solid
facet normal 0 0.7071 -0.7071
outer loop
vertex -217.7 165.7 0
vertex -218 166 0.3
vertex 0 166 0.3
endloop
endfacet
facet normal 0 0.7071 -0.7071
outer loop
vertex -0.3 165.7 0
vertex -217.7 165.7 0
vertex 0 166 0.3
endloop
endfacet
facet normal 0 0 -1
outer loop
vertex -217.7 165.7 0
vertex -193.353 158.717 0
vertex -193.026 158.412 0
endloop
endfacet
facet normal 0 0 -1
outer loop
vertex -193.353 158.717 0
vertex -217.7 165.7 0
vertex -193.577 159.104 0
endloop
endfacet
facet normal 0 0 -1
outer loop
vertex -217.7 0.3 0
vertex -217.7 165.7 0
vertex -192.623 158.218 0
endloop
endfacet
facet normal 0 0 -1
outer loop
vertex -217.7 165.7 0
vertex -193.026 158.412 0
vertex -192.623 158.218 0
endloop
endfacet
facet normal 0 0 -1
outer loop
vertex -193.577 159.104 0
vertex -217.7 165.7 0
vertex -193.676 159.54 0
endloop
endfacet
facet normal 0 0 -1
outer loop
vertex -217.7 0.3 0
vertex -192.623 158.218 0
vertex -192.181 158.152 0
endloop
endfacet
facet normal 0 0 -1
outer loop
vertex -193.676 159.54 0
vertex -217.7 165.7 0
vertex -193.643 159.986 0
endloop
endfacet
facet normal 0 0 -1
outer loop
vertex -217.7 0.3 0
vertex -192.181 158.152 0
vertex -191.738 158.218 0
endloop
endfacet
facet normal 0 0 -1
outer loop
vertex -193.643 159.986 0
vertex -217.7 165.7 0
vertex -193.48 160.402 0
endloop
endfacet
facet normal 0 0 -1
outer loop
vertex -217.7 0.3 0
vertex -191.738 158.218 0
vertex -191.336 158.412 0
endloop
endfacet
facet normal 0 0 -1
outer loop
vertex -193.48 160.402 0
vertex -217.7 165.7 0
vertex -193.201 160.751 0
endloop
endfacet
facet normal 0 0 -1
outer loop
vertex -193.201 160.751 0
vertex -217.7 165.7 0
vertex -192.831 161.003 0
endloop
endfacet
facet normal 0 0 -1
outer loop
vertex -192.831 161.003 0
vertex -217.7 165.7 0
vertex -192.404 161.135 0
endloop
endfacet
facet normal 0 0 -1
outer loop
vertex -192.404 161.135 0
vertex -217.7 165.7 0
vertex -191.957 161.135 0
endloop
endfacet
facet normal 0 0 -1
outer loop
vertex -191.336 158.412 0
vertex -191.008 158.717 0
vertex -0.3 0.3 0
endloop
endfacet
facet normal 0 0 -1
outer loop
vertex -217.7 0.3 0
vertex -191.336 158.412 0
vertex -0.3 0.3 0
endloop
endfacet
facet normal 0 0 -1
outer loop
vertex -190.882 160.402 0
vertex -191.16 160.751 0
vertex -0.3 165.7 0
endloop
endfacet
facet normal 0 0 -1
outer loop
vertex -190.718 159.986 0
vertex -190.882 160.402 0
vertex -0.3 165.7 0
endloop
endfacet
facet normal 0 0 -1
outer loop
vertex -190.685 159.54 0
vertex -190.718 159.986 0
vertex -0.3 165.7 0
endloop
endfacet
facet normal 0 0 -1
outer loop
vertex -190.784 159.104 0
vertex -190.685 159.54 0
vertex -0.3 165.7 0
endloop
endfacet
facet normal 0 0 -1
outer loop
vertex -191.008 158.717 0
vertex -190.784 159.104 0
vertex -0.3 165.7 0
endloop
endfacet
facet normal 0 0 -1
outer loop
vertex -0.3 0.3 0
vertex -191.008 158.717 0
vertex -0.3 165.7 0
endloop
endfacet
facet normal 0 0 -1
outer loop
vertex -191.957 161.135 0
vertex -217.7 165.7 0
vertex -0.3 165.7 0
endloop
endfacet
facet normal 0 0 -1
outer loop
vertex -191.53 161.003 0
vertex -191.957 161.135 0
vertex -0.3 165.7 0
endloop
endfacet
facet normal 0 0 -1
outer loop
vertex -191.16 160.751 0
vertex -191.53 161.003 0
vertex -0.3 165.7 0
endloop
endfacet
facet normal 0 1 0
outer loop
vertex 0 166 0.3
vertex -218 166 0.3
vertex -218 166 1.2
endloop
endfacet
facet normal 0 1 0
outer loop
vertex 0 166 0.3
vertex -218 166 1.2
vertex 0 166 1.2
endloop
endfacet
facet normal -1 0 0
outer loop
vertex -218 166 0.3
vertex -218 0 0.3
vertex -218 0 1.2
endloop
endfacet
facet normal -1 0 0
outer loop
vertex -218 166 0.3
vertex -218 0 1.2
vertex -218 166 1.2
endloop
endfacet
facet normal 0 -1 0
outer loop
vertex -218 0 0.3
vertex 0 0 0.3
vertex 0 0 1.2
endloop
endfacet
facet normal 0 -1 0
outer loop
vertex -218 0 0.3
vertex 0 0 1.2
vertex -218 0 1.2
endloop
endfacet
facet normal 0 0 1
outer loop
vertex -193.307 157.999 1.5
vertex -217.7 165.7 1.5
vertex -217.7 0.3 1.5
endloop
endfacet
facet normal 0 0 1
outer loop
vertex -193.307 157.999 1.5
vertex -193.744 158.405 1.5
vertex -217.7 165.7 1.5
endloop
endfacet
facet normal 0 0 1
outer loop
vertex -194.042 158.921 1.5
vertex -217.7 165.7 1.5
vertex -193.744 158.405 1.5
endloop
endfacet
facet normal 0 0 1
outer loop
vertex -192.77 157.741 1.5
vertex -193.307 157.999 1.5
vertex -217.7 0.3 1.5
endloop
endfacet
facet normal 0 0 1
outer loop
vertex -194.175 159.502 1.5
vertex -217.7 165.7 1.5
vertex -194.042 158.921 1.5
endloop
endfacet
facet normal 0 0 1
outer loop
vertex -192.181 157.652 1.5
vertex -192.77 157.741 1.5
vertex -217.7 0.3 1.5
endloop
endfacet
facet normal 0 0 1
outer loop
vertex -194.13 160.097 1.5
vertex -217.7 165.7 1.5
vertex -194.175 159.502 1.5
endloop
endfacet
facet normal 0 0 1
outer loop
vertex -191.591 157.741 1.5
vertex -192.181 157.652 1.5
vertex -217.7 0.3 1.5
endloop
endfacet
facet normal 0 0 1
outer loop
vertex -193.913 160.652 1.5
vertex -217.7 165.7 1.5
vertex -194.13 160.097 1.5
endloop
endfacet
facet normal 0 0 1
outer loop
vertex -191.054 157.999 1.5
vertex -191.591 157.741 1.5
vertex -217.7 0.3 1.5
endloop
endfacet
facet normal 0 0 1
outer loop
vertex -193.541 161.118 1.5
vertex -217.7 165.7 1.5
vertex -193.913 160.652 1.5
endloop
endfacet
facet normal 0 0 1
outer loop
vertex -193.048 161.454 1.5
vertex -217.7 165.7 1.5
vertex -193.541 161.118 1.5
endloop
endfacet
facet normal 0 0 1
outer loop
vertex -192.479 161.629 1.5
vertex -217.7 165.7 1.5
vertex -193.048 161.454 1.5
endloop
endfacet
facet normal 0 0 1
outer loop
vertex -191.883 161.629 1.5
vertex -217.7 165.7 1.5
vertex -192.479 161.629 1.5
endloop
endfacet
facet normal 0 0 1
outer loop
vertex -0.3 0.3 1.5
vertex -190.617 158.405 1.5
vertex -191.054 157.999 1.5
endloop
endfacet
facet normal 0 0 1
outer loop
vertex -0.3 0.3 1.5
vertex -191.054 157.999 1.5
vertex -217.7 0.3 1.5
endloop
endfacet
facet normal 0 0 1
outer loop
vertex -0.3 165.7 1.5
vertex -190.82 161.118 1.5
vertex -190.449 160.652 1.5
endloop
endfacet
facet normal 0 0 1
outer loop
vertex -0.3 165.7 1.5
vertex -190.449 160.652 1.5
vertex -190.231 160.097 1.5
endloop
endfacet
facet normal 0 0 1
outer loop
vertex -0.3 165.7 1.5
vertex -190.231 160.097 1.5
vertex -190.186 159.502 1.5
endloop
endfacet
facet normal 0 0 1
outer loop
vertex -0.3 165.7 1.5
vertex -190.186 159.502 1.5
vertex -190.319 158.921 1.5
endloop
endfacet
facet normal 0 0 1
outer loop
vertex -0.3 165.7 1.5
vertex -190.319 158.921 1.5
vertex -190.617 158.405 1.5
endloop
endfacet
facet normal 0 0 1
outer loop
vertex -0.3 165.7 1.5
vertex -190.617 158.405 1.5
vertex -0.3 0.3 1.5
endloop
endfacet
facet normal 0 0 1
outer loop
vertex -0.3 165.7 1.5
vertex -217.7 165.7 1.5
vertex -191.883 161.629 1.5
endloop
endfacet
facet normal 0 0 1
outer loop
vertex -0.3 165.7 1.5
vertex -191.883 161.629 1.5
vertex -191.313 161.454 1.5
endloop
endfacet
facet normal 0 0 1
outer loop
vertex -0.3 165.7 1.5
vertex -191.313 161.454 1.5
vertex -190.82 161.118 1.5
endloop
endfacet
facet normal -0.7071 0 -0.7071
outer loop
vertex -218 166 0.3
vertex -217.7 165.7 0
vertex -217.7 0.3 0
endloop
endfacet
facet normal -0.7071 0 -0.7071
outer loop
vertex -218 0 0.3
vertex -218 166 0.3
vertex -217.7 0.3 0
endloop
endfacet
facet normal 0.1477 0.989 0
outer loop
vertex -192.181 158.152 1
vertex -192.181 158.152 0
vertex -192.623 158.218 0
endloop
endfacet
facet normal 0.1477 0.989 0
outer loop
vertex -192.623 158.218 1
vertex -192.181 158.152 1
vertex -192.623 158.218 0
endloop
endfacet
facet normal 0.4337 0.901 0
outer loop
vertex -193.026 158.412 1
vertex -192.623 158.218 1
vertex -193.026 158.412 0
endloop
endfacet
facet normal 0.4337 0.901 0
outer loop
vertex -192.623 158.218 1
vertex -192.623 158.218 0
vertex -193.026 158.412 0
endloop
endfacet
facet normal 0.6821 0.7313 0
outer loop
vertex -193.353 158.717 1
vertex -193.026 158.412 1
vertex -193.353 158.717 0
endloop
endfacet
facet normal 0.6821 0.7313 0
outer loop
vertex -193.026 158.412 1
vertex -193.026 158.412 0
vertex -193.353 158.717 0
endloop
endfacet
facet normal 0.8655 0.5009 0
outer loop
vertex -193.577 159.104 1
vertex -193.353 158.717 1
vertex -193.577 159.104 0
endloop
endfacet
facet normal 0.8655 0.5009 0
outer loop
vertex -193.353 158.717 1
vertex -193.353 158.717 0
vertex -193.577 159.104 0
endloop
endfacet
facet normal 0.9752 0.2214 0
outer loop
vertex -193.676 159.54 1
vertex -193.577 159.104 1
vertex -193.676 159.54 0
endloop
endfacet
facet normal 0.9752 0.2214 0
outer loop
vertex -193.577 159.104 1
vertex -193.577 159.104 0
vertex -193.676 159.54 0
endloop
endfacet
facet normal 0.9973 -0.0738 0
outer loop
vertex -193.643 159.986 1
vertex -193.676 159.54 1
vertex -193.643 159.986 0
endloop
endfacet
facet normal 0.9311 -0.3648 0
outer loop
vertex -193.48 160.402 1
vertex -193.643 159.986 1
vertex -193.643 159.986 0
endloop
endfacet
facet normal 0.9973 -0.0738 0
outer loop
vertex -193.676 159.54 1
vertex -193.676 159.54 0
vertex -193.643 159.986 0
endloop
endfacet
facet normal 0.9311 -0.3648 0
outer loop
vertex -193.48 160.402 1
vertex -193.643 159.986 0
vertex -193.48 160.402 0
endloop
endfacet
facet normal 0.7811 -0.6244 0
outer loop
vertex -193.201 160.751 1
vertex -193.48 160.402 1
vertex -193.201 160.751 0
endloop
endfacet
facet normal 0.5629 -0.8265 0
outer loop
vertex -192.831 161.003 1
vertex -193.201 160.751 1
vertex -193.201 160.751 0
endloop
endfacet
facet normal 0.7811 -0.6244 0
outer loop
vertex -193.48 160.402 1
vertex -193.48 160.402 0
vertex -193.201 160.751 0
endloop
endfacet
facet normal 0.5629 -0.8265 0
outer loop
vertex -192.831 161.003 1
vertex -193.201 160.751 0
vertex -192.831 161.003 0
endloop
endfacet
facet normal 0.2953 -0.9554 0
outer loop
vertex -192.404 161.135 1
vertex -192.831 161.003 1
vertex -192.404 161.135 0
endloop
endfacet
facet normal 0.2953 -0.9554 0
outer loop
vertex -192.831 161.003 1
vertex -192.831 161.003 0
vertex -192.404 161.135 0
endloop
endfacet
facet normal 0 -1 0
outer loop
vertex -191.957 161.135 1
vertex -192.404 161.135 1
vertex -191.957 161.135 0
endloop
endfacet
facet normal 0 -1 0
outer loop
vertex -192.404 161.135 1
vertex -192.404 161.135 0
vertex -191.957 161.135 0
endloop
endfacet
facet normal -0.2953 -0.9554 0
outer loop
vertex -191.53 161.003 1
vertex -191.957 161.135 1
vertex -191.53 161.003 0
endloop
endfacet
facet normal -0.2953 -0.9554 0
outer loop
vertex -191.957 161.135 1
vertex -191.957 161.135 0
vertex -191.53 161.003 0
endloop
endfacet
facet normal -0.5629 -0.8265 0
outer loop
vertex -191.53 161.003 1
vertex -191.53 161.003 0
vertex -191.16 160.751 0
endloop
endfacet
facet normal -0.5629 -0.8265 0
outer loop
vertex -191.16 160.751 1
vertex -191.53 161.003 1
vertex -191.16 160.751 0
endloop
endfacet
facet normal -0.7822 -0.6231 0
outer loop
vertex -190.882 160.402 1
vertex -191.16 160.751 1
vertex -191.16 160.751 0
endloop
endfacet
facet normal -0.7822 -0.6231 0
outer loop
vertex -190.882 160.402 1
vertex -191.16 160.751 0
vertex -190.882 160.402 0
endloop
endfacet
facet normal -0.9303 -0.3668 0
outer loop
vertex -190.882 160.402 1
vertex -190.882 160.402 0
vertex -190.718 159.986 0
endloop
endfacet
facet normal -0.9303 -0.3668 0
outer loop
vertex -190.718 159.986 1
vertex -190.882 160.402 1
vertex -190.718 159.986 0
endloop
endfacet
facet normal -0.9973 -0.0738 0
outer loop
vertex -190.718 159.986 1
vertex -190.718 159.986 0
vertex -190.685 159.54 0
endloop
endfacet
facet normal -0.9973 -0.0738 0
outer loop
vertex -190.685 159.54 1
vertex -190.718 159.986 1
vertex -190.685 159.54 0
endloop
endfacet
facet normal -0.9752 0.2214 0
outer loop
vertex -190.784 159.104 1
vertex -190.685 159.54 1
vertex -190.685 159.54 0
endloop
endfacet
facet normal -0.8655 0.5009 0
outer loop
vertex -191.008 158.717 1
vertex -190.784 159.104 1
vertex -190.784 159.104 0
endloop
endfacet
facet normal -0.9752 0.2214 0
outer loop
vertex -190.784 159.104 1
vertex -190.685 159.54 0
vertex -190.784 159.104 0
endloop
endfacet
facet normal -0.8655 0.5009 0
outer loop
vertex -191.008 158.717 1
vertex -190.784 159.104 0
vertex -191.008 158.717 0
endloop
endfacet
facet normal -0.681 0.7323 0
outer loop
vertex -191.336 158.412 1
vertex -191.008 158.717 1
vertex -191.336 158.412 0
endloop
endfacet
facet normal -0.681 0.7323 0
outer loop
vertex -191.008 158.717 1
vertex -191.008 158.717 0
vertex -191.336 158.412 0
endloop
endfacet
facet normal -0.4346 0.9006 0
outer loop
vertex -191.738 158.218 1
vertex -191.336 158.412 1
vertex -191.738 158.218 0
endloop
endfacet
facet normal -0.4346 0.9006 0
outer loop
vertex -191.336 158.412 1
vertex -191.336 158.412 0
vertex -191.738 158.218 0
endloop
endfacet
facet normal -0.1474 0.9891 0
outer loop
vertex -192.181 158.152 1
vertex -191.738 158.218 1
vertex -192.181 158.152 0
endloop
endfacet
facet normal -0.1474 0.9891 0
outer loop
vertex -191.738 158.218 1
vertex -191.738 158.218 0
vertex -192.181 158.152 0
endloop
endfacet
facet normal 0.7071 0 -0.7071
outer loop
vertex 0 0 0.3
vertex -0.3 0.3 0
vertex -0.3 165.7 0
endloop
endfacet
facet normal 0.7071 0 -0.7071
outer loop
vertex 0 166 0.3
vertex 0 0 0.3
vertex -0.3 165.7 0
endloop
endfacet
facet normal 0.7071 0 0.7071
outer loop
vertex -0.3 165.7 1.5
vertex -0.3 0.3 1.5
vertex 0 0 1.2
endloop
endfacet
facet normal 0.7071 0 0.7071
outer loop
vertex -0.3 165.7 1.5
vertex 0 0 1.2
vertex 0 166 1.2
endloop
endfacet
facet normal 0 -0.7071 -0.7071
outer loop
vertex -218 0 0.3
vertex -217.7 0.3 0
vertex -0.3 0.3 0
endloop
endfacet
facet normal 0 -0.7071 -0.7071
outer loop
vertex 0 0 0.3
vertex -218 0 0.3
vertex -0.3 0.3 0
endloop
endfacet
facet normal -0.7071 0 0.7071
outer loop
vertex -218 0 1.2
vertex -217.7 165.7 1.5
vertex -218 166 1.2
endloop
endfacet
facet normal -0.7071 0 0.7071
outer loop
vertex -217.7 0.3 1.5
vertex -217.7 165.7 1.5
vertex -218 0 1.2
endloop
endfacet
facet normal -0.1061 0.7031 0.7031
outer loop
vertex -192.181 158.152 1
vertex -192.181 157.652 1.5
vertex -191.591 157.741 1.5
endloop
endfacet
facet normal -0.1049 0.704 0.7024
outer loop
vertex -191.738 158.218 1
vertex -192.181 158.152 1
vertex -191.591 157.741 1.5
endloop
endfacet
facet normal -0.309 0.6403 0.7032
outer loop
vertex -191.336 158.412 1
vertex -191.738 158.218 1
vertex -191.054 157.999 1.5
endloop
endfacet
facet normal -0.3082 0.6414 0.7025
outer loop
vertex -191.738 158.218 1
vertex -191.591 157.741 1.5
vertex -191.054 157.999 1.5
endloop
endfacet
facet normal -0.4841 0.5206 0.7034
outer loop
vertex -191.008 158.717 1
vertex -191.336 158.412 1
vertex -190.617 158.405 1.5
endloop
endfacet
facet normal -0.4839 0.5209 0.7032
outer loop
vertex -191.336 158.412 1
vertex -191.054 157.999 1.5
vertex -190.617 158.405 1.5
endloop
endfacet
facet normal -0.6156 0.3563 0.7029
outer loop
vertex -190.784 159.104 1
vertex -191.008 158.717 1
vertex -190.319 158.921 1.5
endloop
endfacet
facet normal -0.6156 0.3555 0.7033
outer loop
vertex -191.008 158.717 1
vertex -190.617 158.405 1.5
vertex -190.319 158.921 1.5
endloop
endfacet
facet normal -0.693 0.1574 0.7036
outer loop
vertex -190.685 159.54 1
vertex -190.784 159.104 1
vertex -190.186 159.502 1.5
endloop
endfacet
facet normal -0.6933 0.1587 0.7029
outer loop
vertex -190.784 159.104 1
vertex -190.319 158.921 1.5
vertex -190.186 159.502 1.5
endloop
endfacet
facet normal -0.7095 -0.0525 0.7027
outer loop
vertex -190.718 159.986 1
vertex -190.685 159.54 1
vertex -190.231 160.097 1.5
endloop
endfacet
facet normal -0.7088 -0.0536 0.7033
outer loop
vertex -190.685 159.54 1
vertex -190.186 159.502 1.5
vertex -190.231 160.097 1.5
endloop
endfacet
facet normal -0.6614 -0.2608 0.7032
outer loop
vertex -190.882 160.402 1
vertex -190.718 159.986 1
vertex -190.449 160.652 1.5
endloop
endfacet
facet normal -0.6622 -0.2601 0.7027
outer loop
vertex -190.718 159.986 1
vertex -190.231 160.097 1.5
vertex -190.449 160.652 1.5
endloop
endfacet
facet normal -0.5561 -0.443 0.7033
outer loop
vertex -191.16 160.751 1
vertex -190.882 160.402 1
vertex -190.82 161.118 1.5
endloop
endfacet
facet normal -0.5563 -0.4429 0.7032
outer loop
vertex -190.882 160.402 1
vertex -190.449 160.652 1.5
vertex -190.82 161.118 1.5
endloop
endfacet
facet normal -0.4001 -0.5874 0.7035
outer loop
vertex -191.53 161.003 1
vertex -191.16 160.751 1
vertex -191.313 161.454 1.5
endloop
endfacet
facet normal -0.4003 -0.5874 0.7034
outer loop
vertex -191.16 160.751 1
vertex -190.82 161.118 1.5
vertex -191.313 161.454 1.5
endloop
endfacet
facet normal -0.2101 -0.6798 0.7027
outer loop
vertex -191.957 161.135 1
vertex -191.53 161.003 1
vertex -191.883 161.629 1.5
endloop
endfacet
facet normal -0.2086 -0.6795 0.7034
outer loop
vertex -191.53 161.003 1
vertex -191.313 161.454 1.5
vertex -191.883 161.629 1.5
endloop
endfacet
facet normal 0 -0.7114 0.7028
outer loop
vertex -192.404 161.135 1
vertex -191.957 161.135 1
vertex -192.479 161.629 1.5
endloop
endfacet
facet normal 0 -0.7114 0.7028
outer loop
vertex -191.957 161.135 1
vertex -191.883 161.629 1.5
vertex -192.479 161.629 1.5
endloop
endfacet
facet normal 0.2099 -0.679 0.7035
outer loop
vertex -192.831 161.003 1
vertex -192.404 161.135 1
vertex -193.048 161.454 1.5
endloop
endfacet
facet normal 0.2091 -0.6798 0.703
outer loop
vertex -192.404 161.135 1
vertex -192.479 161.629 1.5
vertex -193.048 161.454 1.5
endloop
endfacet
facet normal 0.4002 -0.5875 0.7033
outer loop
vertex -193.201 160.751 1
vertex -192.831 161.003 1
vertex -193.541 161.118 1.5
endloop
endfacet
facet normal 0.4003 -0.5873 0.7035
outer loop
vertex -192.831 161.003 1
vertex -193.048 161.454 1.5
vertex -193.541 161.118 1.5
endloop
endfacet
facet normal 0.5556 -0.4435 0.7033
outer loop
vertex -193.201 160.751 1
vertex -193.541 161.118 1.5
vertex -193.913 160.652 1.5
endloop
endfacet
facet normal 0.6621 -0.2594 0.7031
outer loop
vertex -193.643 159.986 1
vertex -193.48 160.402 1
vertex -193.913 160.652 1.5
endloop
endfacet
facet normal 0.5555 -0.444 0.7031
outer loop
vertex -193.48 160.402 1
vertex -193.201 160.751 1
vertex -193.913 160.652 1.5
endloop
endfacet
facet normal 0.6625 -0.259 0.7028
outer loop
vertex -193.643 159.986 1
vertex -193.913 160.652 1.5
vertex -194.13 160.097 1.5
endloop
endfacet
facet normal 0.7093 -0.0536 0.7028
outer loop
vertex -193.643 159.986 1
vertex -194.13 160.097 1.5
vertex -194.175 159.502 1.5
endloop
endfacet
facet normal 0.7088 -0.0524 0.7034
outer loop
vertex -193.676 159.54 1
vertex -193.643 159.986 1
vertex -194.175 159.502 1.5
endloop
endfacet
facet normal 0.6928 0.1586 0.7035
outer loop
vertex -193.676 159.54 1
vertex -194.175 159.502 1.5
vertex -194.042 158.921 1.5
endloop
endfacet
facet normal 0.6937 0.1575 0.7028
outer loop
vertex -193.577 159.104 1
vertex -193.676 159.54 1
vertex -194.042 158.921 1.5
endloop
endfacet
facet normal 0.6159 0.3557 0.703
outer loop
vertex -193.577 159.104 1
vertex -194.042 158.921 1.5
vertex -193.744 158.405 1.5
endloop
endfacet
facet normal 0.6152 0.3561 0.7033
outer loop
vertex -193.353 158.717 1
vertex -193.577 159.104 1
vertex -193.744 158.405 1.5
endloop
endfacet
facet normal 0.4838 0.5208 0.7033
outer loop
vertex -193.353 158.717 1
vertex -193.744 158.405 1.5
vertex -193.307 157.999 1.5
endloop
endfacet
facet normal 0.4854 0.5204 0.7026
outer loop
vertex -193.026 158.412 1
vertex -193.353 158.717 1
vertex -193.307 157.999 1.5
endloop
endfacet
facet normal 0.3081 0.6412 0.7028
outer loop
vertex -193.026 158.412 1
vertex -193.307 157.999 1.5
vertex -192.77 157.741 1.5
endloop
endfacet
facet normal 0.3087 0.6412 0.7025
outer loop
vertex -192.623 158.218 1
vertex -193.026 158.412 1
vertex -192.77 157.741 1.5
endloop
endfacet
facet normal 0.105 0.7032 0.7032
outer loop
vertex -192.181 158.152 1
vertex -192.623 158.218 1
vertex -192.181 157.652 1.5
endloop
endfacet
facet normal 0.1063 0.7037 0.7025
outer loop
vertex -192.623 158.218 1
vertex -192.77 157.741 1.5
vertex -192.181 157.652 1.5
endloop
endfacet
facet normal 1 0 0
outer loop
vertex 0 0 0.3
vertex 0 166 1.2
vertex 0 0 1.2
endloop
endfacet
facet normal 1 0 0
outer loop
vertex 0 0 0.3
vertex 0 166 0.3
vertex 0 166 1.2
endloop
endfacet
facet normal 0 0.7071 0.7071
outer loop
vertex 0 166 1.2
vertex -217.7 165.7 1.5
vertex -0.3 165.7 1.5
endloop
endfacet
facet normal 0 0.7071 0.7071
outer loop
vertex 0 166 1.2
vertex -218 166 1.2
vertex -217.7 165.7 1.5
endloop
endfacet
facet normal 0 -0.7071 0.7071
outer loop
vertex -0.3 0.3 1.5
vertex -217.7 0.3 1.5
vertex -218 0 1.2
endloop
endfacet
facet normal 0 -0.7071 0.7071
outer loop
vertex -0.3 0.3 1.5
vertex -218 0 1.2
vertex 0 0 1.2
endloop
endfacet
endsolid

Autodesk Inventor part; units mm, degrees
ref_plane "YZ Plane" through (0, 0, 0) normal (1, 0, 0) x (0, 1, 0)
ref_plane "XZ Plane" through (0, 0, 0) normal (0, 1, 0) x (-1, 0, 0)
ref_plane "XY Plane" through (0, 0, 0) normal (0, 0, 1) x (1, 0, 0)
sketch "Эскиз1" plane through (0, 0, 0) normal (0, 0, 1) x (1, 0, 0)
  line L0 (0, 0) -> (-218, 0)
  line L1 (-218, 0) -> (-218, 166)
  line L2 (-218, 166) -> (0, 166)
  line L3 (0, 166) -> (0, 0)
  line L4 (-206.585, 154.4751) -> (-20.585, 154.4751)
  line L5 (-20.585, 154.4751) -> (-20.585, 20.4751)
  line L6 (-20.585, 20.4751) -> (-206.585, 20.4751)
  line L7 (-206.585, 20.4751) -> (-206.585, 154.4751)
  dimension "d0" = 218
  dimension "d1" = 166
  dimension "d7" = 186
  dimension "d8" = 134
extrude "Выдавливание1" add sketch "Эскиз1" along normal blind 1.5 contours L0 L1 L2 L3 | L4 L5 L6 L7
chamfer "Фаска1" distance 0.3 angle 45 8 edges at (-109, 166, 1.5) (-218, 83, 1.5) (-109, 0, 1.5) (0, 83, 1.5) (-109, 166, 0) (0, 83, 0) (-218, 83, 0) (-109, 0, 0)
sketch "Эскиз2" plane through (0, 0, 1.5) normal (0, 0, 1) x (1, 0, 0)
  point P0 (0, 0)
  point P1 (-192.1806, 159.6518)
hole "Отверстие1" at (-192.1806, 159.6518, 1.5) direction (0, 0, -1) diameter 3 end through all countersink diameter 4 countersink angle 90
equation "\"Радиус_гибки\" = Толщина"
equation "\"Ширина_просечки\" = Толщина"
equation "\"Глубина_просечки\" = 0.5 * Толщина"
equation "\"Размер_просечки\" = 4 * Толщина"
equation "\"Мин_остаток\" = 2 * Толщина"
equation "\"Радиус_перехода\" = Радиус_гибки"
equation "\"Радиус_Якоби\" = Радиус_гибки"
equation "\"Размер_зазора\" = Толщина"
equation "\"Толщина\" = 3.048"
properties part number "BackCover"
